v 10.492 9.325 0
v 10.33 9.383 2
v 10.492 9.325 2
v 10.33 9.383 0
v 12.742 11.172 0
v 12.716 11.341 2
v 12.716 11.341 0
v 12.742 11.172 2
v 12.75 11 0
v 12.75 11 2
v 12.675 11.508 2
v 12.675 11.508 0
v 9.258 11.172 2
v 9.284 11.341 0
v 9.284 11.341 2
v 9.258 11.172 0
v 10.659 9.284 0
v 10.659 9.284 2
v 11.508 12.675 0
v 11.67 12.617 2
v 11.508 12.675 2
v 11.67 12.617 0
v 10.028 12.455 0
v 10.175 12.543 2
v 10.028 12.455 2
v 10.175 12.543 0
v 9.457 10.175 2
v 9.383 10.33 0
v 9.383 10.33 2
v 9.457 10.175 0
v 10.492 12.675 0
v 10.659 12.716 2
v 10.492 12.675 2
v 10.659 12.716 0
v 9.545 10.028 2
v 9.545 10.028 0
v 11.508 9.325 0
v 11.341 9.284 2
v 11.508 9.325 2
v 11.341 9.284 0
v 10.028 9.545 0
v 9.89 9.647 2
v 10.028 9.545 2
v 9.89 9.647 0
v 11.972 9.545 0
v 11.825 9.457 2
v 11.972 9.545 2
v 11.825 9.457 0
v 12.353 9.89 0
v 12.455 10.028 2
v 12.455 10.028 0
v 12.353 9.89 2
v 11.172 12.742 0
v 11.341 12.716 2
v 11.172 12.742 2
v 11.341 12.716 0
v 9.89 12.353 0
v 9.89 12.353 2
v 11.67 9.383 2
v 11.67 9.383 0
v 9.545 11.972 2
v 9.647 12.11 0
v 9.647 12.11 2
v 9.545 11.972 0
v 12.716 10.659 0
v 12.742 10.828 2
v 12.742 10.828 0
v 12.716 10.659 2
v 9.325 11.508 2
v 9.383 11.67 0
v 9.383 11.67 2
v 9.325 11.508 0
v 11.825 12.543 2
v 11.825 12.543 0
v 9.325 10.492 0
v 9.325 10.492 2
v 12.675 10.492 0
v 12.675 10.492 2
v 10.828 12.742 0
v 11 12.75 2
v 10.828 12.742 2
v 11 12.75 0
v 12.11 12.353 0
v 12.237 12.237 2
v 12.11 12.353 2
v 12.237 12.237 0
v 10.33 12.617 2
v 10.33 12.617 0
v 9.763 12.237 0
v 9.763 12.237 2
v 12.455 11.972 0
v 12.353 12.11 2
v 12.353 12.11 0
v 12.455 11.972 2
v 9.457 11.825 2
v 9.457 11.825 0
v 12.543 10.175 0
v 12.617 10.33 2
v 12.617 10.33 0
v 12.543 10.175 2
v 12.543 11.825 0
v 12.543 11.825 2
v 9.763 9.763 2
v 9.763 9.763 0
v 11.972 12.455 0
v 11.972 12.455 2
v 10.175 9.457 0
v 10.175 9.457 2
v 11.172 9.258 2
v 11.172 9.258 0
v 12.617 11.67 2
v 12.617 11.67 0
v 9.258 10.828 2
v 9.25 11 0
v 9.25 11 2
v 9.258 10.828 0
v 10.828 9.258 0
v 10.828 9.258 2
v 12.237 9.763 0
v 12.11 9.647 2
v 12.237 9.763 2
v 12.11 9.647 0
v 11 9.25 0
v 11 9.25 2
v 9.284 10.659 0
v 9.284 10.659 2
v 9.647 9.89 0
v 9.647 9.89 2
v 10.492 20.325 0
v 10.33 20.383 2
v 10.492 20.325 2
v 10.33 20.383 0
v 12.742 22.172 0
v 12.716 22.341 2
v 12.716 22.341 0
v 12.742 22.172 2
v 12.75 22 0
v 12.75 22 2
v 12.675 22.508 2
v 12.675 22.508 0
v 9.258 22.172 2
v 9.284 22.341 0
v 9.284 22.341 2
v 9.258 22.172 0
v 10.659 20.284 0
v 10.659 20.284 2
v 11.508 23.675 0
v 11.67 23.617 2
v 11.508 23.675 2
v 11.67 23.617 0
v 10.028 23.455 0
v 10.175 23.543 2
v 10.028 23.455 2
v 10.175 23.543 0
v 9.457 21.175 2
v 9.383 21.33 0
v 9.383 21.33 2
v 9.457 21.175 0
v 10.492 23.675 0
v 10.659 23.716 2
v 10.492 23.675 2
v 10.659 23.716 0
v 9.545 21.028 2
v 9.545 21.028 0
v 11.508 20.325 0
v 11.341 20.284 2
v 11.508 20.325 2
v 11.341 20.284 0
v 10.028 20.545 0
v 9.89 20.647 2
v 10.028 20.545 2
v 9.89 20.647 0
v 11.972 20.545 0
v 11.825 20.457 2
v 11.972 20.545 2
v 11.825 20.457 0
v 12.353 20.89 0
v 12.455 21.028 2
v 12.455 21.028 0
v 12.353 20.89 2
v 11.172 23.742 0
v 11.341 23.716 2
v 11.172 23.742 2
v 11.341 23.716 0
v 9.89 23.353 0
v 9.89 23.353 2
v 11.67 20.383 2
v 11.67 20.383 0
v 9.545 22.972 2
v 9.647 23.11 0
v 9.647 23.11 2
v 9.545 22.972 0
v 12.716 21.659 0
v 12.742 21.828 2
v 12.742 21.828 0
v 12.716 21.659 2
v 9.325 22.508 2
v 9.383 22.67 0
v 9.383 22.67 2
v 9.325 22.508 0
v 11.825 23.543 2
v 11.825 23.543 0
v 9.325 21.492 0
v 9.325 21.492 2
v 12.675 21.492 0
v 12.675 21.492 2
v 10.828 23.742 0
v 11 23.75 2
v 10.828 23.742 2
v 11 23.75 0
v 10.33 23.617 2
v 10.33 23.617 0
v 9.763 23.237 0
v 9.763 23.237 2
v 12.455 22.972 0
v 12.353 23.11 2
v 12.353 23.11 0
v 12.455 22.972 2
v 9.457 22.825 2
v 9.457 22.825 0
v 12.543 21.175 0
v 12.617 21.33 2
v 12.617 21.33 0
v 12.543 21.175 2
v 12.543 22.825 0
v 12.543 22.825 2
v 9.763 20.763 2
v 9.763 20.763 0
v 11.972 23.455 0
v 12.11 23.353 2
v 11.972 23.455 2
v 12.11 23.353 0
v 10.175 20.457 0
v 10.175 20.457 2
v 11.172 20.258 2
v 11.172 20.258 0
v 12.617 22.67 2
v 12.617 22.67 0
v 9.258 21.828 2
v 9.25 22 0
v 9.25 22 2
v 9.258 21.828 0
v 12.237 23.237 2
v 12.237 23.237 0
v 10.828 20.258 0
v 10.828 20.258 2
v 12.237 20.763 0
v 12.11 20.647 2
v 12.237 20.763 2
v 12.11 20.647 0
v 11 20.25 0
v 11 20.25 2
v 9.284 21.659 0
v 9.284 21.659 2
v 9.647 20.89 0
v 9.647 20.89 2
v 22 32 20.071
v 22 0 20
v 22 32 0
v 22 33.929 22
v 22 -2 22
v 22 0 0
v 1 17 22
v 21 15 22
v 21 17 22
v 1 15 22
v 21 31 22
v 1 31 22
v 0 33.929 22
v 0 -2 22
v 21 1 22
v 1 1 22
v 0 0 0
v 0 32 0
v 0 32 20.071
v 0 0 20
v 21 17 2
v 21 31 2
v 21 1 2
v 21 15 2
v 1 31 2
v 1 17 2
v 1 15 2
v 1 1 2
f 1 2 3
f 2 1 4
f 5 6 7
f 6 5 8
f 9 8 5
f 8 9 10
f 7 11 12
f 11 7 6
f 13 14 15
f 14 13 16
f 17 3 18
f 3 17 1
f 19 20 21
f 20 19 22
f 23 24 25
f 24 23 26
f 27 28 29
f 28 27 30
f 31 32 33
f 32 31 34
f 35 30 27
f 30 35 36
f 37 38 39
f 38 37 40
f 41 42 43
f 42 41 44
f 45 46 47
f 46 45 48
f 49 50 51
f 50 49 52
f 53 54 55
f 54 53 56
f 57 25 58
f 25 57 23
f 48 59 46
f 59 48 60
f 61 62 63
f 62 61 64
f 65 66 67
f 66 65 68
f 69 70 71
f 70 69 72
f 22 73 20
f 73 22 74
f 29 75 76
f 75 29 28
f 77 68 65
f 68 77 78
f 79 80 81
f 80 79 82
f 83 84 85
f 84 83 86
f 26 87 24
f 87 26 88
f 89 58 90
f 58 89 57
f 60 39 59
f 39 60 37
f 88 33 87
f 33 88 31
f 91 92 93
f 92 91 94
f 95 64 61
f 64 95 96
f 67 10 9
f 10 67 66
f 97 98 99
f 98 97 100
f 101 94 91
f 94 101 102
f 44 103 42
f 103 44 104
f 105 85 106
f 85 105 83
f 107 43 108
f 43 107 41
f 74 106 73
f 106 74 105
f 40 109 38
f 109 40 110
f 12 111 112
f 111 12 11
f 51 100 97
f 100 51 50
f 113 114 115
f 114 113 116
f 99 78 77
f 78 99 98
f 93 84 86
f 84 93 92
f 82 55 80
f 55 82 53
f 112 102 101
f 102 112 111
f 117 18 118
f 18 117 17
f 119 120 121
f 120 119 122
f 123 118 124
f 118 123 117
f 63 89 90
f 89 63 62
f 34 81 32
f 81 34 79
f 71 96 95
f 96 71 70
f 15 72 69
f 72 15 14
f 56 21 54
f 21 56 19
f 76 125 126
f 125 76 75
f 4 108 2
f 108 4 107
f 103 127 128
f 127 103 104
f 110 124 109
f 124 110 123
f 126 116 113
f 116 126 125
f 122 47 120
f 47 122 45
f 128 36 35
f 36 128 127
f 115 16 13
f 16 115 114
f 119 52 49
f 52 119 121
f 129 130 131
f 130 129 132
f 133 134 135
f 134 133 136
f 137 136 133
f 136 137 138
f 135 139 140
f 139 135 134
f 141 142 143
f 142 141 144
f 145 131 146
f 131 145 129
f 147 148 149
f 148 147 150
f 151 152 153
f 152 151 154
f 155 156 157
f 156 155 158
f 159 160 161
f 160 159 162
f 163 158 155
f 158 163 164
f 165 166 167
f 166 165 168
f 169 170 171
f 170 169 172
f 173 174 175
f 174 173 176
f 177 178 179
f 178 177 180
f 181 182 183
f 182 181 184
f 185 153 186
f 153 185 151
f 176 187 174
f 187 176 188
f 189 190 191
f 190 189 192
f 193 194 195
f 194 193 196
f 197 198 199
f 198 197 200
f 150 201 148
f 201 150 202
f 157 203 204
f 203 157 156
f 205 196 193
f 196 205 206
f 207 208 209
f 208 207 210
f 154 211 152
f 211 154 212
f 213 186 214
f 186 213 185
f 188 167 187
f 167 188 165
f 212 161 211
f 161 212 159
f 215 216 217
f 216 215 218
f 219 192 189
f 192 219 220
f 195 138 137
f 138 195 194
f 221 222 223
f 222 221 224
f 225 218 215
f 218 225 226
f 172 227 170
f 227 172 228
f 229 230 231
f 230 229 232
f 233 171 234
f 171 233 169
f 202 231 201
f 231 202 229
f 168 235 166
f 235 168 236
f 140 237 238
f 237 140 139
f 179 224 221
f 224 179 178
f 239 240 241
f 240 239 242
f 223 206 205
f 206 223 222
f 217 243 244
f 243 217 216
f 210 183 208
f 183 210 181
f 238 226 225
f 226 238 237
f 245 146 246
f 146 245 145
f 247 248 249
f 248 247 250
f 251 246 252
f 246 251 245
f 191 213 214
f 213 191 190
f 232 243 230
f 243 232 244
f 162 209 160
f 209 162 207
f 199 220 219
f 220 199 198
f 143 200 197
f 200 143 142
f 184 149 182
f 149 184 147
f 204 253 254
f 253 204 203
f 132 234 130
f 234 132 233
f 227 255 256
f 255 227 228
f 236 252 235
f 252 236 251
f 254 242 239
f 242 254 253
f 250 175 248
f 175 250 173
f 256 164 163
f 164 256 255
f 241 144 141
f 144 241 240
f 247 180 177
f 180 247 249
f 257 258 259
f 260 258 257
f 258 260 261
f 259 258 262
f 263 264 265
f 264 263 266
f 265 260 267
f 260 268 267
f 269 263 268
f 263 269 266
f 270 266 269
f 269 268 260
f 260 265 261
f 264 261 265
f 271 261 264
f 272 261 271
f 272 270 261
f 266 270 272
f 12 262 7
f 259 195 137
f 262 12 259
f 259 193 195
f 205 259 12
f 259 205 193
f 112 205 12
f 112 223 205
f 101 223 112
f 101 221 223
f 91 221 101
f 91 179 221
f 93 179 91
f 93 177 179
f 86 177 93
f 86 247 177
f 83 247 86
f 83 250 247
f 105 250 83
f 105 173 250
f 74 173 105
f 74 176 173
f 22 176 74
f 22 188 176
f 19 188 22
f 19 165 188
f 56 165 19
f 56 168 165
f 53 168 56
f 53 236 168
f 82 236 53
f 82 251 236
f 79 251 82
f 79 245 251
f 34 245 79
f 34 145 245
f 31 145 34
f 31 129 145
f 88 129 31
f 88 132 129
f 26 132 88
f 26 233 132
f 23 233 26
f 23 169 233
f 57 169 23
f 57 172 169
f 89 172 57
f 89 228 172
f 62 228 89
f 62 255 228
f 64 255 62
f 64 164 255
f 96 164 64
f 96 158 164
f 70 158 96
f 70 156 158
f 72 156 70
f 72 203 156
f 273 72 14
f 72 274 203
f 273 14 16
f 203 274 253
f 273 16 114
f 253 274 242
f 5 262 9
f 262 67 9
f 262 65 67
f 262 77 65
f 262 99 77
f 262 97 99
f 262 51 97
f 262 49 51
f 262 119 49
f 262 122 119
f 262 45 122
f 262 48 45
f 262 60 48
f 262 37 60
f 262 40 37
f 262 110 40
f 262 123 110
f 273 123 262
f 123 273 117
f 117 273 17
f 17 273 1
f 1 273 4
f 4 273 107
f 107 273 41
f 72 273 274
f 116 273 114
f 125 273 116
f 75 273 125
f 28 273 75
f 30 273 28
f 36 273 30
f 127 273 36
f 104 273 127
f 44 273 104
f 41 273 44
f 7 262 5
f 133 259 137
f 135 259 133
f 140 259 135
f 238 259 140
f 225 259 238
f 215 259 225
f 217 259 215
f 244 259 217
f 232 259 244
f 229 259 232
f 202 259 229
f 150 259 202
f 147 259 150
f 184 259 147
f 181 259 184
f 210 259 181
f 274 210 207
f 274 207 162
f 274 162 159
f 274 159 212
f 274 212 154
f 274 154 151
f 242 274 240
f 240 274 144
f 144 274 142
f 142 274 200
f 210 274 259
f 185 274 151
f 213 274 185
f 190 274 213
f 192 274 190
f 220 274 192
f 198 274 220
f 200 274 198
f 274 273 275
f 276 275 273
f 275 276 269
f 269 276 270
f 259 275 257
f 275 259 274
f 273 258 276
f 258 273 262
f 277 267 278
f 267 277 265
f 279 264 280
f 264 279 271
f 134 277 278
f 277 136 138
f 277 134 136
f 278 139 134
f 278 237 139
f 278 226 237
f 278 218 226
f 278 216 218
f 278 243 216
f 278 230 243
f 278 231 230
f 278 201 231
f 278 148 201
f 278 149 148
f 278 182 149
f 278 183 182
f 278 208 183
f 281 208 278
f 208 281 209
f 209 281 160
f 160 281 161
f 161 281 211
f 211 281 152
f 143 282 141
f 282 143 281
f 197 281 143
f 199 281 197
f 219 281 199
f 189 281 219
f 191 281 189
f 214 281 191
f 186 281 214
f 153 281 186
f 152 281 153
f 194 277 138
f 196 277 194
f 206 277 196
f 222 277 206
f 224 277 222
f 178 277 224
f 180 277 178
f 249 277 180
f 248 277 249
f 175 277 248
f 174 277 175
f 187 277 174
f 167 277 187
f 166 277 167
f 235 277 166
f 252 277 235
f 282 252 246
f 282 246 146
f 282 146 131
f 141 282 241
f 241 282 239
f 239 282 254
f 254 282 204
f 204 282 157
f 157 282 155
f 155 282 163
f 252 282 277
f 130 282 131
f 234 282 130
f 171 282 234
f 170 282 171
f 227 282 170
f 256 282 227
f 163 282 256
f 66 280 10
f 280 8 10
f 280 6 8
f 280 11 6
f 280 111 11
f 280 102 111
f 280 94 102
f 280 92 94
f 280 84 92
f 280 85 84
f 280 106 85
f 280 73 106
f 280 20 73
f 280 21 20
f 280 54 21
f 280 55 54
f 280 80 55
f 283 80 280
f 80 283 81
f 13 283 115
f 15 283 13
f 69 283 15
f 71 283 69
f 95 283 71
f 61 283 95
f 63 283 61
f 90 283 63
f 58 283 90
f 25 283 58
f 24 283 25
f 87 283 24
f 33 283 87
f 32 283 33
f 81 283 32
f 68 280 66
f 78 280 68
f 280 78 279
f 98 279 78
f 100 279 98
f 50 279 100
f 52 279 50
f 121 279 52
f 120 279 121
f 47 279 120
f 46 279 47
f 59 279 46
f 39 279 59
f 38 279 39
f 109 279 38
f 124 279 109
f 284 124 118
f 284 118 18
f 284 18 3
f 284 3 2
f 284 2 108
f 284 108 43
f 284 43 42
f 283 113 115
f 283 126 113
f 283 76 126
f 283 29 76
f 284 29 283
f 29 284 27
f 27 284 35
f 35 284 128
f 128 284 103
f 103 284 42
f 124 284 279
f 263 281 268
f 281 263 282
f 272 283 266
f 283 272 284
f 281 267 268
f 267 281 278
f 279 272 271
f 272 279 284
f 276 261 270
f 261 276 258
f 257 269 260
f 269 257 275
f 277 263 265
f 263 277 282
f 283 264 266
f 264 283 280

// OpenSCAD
// (C) 2016 B. Visee, info@lichtsignaal.nl
// This is for making lightboxes in, mostly, h0-scale, houses
// No guarentees, but I like it!
// You can make it all sorts of sizes with an adjustable
// number of holes for your LED's (also adjustable!)

// 0.25mm height
// 

// Set parameters as you wish
width = 30;
depth = 20;
height = 20;
diameter = 3.5; // On my da Vinci this is the size for 3mm LED
numholes = 2;

// Leave alone from here, unless you know what you are doing
holedistance = (width / (numholes+1)) + 1;

translate([1,15,2])
{
    cube([20,2,20]);
}

union()
{
    difference()
    {
        cube([height+2,width+2,depth+2]);

        translate([1, 1, 2])
        {
        cube([height,width,depth+2]);
        }

        for (n = [ 1 : numholes ] )
        {
            translate([(height/2)+1,n*holedistance,-3])
            {
                cylinder(10,d=diameter,diameter/2,$fn=64);
            }
        }
    }

    difference()
    {
        translate([0,-2,depth])
        {    
            cube([height+2,2,2]);
        }

        translate([-1,1,depth-1])
        {
            rotate([135,0,0])
            {
                cube([height+4,5,5]);
            }
        }
    }

    difference()
    {
        translate([0,width+2,depth])
        {    
            cube([height+2,2,2]);
        }

        translate([-1,width+8,depth-1])
        {
            rotate([135,0,0])
            {
                cube([height+4,5,5]);
            }
        }
    }
}
